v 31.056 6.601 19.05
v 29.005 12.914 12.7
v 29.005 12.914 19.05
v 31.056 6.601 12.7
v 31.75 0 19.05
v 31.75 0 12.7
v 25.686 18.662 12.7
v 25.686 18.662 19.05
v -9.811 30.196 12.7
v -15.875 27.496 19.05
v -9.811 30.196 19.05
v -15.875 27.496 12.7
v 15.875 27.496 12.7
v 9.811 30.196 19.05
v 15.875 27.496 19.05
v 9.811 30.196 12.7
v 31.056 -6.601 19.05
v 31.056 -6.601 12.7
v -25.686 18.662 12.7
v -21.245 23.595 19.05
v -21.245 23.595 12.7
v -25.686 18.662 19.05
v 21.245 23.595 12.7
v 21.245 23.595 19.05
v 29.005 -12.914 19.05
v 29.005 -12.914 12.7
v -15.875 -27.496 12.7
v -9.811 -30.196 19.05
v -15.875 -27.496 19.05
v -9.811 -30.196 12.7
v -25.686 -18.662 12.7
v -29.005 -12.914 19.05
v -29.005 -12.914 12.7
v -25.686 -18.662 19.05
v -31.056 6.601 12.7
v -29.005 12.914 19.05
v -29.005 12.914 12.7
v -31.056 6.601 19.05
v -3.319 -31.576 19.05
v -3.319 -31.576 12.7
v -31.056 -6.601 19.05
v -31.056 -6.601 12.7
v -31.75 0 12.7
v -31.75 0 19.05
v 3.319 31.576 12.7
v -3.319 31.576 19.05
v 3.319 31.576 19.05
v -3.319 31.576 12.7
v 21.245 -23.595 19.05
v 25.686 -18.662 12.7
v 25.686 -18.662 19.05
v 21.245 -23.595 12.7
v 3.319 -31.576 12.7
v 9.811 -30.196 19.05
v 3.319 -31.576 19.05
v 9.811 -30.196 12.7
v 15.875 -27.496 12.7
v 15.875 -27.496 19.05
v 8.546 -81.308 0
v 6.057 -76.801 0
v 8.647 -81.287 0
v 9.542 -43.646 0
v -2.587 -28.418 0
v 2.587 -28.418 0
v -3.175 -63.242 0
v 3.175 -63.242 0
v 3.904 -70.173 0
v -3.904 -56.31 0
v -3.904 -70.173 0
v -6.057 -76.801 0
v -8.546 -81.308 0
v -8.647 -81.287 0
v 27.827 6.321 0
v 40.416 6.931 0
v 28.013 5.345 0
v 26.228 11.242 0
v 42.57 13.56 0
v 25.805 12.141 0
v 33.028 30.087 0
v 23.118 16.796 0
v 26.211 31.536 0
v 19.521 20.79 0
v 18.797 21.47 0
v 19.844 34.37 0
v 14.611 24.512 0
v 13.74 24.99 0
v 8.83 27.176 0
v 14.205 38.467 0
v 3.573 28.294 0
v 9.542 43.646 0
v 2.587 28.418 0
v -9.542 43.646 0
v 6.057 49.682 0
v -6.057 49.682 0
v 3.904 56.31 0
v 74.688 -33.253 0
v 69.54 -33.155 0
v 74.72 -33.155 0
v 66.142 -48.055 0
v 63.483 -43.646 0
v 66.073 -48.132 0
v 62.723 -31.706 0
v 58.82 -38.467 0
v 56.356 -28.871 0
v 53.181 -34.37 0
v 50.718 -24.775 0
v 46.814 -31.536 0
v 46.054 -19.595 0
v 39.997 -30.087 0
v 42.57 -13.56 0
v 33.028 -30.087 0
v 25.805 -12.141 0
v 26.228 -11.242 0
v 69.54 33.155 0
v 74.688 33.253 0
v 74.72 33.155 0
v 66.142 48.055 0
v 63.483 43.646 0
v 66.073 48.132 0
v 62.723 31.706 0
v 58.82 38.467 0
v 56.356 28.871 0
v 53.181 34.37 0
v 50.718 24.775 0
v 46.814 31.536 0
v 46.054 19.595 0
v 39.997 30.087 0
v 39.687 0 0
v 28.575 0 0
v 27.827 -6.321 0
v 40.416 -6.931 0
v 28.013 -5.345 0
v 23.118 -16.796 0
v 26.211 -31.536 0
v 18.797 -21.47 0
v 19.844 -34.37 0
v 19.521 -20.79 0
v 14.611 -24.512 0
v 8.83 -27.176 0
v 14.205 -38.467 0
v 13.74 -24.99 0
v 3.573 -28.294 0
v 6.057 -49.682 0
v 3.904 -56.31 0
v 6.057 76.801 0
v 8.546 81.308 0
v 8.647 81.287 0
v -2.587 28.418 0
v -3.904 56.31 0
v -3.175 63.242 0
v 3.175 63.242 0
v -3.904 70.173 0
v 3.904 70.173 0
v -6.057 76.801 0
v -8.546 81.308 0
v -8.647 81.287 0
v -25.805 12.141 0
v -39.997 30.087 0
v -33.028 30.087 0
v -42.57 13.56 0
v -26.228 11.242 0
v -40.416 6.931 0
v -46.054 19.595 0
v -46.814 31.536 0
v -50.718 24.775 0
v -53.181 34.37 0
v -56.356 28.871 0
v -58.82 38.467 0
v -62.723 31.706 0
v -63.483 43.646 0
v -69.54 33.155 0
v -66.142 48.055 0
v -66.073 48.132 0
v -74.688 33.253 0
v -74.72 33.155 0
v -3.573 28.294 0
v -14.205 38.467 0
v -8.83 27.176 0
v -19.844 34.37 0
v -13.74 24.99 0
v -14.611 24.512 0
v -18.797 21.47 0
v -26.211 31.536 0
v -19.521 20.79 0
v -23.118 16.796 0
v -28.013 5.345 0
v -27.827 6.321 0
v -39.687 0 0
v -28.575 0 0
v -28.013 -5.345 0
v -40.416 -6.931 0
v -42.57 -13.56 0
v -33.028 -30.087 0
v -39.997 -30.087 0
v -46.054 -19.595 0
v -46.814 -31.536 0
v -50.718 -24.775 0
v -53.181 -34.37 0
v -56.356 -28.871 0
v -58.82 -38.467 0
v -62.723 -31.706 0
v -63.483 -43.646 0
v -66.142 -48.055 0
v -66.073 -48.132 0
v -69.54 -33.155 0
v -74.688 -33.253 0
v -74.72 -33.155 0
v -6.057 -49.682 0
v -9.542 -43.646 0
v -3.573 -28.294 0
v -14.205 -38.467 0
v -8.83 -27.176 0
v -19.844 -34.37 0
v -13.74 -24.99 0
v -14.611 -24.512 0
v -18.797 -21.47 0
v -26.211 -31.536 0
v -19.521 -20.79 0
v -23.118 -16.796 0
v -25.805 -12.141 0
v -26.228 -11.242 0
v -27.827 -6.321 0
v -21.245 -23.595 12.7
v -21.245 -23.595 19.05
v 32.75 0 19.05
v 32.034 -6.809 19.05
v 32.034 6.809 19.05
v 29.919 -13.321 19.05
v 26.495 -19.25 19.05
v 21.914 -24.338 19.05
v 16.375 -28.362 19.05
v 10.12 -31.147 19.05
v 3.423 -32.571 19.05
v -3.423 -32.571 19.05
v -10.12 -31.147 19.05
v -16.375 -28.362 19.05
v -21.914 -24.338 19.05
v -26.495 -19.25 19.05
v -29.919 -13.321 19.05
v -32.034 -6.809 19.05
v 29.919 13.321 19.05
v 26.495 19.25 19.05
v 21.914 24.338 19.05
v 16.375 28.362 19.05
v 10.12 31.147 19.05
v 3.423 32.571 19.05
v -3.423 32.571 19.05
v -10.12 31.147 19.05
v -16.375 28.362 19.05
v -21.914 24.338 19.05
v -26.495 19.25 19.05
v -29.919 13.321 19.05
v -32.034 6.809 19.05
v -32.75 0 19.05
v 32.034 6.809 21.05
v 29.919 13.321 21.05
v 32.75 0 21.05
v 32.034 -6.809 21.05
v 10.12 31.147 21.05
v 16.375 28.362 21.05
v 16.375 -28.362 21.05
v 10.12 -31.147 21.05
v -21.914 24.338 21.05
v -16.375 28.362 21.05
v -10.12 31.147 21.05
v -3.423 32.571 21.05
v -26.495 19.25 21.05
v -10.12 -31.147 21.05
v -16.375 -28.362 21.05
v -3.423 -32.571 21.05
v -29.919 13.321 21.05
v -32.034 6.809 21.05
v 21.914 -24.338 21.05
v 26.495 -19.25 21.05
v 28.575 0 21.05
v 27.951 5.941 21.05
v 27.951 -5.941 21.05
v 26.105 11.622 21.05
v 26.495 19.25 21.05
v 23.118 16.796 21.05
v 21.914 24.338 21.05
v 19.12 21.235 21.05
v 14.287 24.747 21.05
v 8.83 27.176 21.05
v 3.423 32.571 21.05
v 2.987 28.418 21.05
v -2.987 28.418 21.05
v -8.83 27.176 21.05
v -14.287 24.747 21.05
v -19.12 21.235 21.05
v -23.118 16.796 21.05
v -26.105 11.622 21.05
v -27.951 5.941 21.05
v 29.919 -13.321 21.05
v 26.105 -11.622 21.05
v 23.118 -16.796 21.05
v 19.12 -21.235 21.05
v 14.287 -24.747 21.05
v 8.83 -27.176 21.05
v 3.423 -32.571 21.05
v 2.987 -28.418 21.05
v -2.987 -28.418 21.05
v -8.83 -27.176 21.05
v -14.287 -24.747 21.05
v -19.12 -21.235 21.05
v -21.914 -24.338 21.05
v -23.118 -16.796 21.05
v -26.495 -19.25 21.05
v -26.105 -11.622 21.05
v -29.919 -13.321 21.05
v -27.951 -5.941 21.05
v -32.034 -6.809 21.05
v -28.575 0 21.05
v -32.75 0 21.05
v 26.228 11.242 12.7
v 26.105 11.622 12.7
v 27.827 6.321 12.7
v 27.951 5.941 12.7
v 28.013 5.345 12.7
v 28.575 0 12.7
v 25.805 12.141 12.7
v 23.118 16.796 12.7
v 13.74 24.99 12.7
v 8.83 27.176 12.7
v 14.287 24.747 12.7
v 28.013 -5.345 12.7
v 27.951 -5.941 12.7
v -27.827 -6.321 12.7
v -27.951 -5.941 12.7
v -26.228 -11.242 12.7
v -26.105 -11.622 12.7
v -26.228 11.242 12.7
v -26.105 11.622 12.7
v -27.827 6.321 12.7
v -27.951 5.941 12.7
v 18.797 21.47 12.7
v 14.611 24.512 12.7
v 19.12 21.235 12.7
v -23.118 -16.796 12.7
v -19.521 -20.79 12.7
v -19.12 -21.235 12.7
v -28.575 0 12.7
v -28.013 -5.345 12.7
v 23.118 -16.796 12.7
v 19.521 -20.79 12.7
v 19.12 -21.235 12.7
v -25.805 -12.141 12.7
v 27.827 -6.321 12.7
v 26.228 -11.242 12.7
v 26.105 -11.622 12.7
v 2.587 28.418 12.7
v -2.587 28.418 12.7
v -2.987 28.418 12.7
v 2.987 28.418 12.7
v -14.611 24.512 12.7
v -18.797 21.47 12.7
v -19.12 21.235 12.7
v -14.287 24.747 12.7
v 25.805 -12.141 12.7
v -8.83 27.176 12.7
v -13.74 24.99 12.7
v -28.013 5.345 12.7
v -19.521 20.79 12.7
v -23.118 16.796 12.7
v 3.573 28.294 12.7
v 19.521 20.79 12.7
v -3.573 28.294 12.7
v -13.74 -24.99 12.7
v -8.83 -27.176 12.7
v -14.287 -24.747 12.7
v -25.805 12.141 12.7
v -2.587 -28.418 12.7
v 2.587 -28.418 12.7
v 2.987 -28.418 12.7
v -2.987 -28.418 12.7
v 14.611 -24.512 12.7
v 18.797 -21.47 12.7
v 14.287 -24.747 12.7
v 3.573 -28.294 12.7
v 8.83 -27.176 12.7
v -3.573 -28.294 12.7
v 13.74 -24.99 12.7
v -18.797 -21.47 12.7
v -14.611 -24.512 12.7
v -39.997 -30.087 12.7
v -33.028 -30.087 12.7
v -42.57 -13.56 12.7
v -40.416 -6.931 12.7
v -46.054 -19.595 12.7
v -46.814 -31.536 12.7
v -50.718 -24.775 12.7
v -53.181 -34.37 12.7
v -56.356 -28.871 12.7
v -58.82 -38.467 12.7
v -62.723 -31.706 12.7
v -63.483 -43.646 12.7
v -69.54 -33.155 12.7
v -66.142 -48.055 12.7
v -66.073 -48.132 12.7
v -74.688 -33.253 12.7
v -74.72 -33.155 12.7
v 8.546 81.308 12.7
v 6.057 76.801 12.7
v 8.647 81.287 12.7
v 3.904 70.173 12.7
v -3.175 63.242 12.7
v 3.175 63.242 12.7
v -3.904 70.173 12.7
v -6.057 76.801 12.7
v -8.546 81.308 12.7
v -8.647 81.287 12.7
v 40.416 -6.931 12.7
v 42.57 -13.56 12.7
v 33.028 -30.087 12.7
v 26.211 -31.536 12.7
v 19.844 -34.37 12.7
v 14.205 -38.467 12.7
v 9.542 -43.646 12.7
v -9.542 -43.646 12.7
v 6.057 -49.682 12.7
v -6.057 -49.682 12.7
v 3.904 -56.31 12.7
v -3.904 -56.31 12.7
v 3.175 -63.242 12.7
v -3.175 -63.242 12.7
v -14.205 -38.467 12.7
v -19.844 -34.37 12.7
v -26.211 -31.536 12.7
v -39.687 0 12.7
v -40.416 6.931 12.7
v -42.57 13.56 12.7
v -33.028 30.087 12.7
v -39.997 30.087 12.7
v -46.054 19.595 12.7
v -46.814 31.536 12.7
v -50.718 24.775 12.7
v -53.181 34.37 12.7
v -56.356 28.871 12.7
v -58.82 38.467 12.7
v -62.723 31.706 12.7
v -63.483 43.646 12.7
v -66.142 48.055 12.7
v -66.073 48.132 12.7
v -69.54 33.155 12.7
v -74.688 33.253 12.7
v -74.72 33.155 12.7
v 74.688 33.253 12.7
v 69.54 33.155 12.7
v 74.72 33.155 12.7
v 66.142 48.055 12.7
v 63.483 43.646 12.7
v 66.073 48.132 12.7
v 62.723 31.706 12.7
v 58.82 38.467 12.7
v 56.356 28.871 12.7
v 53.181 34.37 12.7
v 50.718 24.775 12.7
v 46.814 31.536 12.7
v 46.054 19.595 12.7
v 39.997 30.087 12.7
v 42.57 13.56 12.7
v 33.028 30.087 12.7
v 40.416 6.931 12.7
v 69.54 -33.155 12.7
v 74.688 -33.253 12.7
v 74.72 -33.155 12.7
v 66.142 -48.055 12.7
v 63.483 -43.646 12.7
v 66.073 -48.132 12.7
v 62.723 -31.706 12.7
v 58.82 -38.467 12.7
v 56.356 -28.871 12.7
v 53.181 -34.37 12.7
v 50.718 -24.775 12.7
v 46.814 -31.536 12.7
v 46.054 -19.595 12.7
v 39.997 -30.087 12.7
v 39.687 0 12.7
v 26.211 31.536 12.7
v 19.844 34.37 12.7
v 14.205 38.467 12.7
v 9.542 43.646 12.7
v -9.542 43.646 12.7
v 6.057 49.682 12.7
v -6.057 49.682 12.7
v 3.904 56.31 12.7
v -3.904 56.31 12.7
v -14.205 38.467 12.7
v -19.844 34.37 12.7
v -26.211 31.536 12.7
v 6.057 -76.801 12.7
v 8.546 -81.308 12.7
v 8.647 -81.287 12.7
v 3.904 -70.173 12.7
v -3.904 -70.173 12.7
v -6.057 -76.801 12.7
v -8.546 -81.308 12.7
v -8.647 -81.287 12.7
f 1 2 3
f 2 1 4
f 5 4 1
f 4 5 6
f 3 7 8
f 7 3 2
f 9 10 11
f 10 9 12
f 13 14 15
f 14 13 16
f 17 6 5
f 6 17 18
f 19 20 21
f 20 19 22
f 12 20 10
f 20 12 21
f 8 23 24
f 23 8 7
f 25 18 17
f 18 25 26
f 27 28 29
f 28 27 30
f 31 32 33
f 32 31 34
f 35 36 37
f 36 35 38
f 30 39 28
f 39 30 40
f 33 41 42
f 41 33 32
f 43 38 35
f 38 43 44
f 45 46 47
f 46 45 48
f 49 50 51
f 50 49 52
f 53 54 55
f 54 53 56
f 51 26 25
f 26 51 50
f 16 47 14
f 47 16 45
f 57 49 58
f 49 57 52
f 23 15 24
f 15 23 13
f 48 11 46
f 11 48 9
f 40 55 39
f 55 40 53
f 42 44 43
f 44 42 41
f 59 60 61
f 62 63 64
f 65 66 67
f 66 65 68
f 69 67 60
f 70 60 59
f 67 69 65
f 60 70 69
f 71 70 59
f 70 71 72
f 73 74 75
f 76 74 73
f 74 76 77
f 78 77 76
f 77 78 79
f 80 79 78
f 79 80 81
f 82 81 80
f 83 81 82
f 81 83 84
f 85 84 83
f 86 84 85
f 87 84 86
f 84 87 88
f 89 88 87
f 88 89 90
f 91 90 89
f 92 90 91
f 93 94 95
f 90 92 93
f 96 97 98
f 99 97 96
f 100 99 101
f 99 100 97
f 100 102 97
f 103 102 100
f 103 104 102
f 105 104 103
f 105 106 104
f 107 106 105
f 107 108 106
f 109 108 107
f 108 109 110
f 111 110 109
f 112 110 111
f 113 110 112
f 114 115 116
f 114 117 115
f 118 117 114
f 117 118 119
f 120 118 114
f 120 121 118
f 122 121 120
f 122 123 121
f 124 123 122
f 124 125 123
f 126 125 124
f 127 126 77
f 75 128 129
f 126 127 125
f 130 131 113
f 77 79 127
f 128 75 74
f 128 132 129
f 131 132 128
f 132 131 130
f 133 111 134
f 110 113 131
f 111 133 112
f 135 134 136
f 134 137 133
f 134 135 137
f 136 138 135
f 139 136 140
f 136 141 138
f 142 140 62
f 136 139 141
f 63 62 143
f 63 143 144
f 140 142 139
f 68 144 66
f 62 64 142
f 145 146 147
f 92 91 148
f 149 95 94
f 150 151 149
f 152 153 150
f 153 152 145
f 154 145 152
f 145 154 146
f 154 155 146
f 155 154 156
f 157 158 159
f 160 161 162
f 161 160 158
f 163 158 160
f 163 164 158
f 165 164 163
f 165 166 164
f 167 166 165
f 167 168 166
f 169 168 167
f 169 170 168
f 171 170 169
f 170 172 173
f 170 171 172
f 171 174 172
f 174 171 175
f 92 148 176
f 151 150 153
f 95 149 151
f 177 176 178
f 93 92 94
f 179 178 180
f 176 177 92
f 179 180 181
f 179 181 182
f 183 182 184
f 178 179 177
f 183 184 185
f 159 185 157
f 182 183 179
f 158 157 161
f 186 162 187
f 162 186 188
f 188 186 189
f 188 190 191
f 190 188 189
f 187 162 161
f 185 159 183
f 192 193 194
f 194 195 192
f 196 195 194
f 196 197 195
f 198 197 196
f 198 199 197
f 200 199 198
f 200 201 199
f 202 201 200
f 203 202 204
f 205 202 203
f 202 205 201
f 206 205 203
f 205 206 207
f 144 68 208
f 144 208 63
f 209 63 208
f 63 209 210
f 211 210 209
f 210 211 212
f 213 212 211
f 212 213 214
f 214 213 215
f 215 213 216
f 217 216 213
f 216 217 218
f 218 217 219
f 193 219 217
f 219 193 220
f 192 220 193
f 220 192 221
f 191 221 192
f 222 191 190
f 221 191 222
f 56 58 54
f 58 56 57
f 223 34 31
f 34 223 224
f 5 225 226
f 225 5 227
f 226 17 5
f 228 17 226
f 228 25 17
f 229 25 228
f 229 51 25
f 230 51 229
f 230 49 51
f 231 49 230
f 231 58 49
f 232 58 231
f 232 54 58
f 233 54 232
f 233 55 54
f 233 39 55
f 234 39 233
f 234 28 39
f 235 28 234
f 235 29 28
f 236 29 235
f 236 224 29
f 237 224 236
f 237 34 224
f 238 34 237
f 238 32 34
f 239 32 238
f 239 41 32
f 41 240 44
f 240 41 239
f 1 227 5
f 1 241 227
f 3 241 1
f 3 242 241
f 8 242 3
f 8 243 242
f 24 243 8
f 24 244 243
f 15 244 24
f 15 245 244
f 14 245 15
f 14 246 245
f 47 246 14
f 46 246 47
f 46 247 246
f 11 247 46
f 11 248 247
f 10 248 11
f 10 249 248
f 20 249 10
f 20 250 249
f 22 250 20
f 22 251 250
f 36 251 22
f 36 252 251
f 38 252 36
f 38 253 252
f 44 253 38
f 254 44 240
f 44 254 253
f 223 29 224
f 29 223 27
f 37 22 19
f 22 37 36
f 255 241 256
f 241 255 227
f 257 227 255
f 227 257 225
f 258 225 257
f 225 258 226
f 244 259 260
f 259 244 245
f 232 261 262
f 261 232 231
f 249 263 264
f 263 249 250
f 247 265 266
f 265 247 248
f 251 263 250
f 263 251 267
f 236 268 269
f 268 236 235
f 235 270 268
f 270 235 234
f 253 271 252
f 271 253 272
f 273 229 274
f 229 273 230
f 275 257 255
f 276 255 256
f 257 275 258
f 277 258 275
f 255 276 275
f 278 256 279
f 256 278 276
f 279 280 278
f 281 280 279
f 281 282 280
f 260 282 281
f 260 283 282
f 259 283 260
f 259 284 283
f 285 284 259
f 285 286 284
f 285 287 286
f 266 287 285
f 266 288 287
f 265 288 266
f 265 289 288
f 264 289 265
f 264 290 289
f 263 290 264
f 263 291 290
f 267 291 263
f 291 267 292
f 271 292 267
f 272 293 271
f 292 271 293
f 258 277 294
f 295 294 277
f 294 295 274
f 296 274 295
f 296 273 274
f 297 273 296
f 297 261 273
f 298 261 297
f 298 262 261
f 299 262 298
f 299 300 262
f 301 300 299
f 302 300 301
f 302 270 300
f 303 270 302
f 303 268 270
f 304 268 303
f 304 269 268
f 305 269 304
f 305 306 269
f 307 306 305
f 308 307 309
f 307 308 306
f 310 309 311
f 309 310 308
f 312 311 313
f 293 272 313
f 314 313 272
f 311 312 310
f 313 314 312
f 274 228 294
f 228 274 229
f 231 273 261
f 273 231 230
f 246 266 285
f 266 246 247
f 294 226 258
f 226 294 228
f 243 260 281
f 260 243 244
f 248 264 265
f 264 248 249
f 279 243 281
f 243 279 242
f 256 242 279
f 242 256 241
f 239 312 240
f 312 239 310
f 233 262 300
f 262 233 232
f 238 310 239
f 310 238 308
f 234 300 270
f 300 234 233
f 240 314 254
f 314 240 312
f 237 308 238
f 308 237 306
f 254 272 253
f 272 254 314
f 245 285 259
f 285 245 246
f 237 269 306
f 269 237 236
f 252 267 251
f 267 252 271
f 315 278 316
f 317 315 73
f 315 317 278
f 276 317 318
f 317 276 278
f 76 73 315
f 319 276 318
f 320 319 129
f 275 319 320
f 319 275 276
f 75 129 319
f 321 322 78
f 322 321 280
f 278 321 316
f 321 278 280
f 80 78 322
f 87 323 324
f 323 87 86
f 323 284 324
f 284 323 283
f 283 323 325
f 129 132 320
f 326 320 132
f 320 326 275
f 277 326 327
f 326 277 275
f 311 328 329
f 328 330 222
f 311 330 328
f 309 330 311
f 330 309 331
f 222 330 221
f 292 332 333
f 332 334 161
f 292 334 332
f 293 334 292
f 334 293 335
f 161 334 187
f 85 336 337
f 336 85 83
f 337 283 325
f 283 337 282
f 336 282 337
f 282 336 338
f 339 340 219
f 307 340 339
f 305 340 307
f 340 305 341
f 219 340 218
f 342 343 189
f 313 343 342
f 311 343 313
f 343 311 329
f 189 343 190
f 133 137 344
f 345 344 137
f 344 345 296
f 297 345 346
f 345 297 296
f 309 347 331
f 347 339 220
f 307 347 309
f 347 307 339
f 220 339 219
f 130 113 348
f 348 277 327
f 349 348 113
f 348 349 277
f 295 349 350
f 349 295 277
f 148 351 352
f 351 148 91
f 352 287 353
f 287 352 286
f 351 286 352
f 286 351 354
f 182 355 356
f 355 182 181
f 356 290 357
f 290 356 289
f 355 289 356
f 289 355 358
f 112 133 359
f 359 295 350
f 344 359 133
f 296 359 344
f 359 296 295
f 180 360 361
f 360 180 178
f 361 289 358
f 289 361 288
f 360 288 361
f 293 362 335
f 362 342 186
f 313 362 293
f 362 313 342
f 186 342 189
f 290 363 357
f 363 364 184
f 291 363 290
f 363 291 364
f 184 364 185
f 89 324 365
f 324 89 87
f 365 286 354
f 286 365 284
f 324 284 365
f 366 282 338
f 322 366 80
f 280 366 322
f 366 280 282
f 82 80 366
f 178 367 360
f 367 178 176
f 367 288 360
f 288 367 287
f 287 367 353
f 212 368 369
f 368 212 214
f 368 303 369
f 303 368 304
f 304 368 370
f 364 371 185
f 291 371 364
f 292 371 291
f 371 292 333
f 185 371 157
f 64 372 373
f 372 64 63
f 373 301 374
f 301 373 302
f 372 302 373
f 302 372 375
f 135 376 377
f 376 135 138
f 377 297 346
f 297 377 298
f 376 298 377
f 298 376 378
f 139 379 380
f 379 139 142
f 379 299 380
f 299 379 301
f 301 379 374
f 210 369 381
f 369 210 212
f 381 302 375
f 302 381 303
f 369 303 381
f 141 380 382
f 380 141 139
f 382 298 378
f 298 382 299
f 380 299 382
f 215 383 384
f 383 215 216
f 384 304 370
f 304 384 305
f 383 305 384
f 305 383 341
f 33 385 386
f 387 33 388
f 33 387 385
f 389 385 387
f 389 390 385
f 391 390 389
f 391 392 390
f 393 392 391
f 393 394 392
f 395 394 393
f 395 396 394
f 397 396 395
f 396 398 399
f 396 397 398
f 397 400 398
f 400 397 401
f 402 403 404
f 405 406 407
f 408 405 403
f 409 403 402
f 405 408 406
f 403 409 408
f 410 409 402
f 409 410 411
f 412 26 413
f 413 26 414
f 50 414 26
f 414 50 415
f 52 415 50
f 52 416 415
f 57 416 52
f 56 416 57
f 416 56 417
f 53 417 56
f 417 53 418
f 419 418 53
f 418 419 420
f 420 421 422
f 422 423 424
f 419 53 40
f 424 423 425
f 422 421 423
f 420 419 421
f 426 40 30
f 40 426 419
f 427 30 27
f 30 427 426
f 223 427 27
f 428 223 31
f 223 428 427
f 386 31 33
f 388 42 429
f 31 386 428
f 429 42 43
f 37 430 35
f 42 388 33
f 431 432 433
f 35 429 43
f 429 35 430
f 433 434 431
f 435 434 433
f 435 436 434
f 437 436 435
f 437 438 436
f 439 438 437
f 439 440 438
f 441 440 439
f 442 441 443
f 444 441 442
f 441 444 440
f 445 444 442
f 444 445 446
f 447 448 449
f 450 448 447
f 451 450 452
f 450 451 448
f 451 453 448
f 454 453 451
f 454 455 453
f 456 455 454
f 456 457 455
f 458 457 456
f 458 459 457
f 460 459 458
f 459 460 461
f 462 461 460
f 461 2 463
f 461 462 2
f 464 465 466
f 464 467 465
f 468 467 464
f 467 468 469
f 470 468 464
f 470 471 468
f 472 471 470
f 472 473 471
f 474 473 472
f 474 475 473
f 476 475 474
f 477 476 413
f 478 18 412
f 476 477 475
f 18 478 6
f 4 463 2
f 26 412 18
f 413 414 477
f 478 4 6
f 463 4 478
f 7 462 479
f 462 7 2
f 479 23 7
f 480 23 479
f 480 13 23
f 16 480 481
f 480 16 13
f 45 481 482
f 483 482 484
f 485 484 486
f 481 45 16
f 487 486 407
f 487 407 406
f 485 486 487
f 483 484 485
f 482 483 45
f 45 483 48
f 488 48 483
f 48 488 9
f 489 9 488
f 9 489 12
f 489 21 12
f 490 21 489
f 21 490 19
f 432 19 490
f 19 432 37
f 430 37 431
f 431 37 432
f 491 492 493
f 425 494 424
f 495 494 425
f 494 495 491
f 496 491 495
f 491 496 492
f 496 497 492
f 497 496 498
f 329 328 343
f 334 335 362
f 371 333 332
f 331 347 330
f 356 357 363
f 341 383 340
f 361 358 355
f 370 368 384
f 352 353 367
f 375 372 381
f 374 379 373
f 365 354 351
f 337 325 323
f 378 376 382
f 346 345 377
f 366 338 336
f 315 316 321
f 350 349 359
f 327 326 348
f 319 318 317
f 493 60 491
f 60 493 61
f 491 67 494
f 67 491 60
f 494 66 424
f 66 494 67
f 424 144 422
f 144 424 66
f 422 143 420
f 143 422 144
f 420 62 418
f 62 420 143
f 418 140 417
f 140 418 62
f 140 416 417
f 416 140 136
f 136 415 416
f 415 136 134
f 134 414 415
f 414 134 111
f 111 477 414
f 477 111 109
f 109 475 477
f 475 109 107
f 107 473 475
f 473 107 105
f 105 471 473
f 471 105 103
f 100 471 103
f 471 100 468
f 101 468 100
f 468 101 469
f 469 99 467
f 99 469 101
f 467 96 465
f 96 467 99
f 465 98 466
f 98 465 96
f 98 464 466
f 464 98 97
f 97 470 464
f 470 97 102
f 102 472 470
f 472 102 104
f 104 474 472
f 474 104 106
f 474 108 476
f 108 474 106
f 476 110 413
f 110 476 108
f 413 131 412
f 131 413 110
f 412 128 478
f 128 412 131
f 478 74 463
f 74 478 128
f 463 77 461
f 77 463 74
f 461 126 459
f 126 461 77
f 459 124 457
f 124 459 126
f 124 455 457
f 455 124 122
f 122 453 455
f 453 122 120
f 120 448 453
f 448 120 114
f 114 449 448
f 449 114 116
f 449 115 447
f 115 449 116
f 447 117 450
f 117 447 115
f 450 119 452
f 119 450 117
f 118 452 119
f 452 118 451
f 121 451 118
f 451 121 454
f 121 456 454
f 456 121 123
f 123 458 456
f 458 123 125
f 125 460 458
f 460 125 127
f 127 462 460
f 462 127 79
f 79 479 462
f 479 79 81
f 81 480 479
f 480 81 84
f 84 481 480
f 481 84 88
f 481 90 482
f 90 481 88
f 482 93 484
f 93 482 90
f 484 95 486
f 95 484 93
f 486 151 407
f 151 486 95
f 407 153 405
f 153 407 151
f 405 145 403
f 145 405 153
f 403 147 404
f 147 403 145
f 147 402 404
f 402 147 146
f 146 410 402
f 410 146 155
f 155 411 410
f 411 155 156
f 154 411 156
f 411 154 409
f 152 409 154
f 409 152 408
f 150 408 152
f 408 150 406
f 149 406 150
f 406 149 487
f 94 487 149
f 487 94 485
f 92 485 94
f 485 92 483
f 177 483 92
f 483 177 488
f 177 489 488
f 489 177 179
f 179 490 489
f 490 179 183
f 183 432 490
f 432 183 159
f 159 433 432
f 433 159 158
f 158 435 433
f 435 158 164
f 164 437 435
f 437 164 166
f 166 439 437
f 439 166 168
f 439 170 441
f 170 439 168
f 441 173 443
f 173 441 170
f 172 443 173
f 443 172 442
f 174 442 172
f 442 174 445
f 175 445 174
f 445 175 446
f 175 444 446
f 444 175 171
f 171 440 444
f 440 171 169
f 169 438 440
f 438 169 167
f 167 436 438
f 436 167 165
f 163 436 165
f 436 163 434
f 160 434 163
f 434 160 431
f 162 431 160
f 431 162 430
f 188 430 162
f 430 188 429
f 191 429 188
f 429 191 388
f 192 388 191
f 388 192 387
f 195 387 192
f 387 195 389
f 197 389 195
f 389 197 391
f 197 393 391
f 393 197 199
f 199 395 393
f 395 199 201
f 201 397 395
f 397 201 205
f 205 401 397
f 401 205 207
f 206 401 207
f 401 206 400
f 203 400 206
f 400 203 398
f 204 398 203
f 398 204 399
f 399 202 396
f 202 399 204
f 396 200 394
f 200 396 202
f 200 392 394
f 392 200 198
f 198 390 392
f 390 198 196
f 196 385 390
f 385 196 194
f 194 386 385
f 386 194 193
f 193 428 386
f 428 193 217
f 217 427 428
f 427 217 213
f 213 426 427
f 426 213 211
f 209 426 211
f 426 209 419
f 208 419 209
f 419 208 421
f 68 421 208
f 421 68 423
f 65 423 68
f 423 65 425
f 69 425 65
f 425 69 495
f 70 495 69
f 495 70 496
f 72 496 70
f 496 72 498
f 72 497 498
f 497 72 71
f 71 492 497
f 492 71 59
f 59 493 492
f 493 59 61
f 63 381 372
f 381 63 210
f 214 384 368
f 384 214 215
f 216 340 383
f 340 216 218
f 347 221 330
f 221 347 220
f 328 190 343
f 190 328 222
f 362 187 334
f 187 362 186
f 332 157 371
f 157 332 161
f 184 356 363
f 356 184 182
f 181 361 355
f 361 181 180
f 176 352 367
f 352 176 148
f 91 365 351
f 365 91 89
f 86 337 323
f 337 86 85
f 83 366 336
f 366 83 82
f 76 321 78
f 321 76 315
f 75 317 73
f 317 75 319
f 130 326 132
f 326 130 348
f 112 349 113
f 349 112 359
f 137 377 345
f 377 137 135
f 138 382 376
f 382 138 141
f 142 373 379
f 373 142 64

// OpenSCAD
//bracket that slips over a pneumatic cylinder of size cyl_od
// and attaches 6 clippard tanks to it
// print 2, slip over cylinder 
in=25.4;
cyl_od = (2+1/4)*in;    //add extra for foam tape
h=.5*in;

tank_od = 2.5*in + in*1/8;  //add extra for foam tape
tank_space = .25*in;

zip=.25*in;
lip=2; // lip to hold on zip tie

difference() {
union() {
    // create a spot for a zip tie
difference() {
    union() {
        cylinder(d=cyl_od+tank_space, h=h+zip);
        translate([0,0,h+zip]) cylinder(d=cyl_od+tank_space+lip, h=lip);
    }
    cylinder(d=cyl_od, h=h+zip+lip);
}

linear_extrude(h) {
    difference() {
        circle(d=cyl_od+tank_space+1.5*tank_od); // chop the whole thing
        
        circle(d=cyl_od, $fn=50);   //main cylinder
        
        for (a=[0:60:359]) {
            rotate([0,0,a]) 
                translate([(tank_od+tank_space), 0, 0])
                    circle(d=tank_od, h=h);
        }
    }
}
}
*translate([-(cyl_od+tank_od+tank_space)/2, -0.5, 0])
   # cube([(cyl_od+tank_od+tank_space), 1, h+zip+lip]);
}
